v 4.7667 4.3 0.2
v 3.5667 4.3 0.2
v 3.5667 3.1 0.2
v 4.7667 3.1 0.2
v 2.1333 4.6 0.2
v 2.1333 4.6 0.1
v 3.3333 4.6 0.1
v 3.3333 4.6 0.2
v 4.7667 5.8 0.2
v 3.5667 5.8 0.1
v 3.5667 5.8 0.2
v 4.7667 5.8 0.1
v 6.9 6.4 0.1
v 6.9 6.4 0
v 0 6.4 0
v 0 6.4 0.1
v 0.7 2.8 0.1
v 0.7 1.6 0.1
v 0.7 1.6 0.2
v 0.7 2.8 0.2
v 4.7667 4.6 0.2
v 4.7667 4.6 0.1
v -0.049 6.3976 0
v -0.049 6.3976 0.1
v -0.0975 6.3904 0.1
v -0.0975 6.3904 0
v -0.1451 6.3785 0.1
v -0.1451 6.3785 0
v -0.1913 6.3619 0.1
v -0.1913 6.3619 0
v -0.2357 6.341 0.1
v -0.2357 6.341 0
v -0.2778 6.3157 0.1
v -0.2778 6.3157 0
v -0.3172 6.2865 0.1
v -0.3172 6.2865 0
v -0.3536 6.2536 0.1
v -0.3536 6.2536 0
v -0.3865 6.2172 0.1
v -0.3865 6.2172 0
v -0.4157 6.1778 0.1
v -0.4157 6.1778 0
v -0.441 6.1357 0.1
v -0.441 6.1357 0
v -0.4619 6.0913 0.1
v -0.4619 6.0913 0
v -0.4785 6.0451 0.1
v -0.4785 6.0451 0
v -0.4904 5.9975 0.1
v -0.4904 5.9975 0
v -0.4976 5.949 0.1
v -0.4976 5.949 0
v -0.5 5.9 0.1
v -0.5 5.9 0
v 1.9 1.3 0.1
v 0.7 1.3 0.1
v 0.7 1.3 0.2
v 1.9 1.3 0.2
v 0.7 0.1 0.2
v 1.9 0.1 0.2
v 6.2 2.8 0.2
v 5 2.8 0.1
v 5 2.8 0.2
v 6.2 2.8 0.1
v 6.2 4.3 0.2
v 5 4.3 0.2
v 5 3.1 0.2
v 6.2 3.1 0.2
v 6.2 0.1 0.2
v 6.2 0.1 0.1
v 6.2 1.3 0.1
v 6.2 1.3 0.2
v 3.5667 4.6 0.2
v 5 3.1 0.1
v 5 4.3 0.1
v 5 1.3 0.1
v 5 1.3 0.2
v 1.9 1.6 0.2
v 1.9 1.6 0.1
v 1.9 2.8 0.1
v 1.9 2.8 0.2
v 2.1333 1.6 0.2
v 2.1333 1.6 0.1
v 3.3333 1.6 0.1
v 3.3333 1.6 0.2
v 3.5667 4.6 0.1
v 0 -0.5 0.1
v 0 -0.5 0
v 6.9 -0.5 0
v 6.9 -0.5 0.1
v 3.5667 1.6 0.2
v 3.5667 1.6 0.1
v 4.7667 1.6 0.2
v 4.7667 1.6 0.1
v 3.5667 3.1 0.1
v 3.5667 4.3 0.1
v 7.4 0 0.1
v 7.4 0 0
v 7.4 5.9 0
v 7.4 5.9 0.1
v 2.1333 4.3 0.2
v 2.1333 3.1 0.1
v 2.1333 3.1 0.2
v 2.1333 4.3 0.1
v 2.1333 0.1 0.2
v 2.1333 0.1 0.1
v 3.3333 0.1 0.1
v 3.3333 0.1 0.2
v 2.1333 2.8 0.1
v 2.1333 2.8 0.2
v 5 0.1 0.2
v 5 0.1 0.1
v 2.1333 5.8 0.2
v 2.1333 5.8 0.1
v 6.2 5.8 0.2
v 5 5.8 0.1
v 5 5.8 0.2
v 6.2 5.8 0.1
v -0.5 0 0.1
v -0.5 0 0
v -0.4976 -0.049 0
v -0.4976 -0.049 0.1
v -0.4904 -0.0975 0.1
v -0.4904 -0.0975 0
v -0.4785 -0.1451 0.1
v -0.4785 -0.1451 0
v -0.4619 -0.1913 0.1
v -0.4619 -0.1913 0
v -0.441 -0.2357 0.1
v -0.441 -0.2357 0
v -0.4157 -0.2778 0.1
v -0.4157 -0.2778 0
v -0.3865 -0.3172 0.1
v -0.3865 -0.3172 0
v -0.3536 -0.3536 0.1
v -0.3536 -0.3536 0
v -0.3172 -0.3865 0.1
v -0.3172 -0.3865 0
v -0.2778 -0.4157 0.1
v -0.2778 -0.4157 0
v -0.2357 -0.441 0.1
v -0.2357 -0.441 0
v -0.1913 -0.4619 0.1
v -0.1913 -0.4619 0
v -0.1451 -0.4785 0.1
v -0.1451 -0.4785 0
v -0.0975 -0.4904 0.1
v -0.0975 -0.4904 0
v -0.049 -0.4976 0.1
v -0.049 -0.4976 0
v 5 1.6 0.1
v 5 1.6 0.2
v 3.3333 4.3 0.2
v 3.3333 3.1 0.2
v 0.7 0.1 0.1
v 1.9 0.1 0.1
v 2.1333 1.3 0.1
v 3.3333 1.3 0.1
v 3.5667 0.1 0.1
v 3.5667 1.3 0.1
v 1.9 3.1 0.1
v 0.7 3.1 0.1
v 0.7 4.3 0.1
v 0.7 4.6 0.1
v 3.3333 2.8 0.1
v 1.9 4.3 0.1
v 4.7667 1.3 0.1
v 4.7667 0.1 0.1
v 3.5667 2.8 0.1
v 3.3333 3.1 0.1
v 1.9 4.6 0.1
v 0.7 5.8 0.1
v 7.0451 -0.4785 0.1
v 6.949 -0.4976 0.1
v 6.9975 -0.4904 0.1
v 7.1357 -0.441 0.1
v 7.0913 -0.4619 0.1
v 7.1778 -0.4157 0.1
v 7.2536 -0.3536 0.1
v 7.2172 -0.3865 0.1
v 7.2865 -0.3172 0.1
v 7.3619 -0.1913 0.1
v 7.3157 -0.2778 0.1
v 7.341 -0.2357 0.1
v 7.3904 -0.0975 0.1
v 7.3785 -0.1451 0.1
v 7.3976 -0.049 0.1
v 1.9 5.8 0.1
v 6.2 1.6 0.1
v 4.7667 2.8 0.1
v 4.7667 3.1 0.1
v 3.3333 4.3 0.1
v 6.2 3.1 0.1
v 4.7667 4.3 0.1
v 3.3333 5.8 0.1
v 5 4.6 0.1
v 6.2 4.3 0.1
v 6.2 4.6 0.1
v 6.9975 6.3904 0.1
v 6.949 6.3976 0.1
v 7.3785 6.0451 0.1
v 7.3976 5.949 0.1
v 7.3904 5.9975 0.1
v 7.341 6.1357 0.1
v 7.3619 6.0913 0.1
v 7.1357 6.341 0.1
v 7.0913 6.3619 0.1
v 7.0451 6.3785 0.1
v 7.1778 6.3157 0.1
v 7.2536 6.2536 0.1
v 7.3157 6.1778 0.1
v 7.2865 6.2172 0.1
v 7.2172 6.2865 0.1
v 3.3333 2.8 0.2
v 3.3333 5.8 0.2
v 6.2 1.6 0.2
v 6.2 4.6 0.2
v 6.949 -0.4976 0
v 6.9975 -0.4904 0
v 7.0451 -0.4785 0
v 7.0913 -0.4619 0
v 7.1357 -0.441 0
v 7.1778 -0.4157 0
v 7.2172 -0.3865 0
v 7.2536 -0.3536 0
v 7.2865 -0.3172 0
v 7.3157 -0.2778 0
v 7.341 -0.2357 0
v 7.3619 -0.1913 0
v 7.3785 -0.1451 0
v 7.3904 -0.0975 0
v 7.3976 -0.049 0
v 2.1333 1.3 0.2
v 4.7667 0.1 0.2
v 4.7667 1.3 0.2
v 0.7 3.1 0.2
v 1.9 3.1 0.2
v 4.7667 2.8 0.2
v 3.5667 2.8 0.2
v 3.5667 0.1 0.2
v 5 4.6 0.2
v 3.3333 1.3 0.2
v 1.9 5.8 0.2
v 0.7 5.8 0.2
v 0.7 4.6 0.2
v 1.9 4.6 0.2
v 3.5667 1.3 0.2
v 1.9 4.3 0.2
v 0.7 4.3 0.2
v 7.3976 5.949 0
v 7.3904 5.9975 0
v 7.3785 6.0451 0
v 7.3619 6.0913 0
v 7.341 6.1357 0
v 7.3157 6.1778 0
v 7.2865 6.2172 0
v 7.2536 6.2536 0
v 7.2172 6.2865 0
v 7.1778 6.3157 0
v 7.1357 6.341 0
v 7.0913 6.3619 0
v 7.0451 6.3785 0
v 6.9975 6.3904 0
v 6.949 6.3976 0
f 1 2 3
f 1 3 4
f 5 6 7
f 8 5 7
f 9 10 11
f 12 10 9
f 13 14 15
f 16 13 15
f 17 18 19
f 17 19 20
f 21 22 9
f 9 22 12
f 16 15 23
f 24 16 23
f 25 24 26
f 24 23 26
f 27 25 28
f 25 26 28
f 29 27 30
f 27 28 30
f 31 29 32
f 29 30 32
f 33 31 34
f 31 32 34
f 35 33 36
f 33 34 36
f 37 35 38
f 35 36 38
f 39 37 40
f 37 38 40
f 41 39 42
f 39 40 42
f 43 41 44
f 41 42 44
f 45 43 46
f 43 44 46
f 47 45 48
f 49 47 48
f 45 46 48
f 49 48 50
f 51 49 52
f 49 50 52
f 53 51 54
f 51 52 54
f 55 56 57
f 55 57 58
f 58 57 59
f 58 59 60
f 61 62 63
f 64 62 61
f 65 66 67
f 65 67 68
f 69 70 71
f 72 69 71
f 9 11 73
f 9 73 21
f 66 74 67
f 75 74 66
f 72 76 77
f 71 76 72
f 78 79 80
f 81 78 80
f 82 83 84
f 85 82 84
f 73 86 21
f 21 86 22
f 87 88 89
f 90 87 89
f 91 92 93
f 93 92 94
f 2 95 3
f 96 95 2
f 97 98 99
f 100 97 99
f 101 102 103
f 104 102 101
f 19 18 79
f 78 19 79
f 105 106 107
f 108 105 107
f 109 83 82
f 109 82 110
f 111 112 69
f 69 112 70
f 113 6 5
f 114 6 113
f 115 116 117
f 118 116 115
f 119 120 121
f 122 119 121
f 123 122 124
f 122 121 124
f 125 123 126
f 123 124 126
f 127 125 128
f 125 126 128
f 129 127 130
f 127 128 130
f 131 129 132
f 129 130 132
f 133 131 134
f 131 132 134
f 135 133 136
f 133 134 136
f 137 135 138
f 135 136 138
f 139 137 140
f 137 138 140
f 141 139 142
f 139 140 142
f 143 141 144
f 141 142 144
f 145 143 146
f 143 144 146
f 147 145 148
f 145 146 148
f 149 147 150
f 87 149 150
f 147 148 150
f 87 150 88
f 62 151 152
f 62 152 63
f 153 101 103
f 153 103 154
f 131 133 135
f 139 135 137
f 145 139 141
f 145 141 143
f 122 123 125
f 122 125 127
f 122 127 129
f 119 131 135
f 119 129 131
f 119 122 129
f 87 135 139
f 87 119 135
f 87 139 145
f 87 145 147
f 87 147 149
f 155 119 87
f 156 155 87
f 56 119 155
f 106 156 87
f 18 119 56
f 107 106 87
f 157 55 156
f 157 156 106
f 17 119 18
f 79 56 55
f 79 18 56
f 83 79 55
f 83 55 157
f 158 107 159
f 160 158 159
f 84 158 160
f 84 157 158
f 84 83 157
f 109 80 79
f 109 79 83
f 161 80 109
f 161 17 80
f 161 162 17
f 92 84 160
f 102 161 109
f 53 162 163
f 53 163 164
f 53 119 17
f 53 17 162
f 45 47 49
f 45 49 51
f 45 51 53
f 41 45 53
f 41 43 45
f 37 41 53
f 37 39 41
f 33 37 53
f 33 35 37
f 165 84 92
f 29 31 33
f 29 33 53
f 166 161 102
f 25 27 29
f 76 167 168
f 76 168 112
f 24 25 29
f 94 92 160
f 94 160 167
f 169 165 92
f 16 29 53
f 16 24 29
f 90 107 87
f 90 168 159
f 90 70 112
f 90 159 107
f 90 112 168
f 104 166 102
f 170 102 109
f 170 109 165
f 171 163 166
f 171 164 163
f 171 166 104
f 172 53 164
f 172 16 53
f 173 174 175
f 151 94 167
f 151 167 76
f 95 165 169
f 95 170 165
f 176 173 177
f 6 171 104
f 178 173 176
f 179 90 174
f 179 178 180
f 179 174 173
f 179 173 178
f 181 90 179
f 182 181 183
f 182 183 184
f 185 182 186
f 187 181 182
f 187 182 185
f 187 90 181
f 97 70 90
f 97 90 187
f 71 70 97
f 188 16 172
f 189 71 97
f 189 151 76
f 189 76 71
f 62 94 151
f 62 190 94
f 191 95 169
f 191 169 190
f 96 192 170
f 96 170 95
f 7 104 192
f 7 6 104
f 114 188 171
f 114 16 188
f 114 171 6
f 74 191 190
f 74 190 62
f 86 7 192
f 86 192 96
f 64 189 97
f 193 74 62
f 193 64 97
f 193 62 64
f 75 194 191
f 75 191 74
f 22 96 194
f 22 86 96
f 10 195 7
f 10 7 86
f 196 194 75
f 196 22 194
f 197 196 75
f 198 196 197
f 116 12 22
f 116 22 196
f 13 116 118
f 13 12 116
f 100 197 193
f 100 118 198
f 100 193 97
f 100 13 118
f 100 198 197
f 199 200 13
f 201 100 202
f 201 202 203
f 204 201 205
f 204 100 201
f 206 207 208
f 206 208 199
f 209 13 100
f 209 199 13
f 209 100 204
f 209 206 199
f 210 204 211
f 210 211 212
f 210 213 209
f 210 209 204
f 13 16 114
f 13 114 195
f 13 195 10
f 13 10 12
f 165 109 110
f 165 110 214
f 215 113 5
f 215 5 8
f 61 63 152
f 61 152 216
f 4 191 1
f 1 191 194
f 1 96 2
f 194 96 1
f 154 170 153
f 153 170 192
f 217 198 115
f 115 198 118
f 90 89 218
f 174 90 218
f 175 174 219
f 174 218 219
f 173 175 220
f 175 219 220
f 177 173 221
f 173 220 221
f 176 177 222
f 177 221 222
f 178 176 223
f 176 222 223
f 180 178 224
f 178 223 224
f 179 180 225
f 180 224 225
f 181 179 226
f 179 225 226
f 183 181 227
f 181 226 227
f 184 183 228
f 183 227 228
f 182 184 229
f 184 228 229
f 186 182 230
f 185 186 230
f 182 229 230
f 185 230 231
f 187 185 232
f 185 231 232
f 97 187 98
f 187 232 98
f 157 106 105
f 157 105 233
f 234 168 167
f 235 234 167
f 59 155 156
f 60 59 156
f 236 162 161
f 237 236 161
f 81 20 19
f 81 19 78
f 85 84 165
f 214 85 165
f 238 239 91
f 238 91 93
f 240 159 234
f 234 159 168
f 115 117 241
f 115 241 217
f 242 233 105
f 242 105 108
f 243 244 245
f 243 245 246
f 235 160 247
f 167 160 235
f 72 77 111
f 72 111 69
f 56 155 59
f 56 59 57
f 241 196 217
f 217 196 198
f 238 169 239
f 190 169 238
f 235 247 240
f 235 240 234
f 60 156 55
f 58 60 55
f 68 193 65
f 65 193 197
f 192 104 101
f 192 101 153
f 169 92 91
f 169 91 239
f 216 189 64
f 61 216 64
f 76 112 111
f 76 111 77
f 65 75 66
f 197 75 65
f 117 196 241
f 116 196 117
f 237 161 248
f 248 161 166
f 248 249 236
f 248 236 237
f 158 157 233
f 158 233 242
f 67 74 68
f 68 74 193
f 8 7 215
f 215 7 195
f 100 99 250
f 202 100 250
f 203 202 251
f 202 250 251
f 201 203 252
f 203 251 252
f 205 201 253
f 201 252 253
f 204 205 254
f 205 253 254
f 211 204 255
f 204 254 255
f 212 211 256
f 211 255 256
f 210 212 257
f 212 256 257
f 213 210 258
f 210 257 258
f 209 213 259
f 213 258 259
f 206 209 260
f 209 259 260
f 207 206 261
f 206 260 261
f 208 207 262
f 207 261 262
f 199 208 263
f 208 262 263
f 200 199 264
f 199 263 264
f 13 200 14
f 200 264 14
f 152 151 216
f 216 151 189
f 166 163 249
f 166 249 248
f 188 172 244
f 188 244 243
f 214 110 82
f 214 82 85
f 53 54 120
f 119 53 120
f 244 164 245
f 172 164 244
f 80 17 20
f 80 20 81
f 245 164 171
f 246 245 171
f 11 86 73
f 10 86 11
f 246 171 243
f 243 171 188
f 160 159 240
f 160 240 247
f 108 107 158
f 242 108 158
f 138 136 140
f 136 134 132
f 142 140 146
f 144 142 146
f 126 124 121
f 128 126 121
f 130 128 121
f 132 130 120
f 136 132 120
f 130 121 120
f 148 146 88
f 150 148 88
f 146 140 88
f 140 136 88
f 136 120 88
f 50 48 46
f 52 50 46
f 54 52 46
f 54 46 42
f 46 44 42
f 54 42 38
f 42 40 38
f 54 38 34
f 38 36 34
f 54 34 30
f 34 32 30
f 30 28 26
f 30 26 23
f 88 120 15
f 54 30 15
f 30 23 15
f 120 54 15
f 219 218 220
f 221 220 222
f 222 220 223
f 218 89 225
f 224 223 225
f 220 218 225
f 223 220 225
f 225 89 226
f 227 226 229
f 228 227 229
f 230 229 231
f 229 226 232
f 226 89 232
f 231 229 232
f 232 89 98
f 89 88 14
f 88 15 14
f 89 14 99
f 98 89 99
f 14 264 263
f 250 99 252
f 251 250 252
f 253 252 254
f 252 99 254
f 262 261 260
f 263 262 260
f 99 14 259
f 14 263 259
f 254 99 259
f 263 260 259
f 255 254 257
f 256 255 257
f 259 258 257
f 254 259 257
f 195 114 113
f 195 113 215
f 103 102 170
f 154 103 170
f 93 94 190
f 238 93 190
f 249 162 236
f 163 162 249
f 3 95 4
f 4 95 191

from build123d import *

# Parameters (mm, degrees)
BOSS_EXTRU_1_DEPTH = 0.1
ESQUISSE2_W        = 1.2
ESQUISSE2_H        = 1.2
BOSS_EXTRU_2_DEPTH = 0.1


with BuildPart() as part:
    # Esquisse1 → Boss.-Extru.1 (new body)
    with BuildSketch(Plane.XY):
        with BuildLine():
            Line((0, -0.5), (6.9, -0.5))
            ThreePointArc((6.9, -0.5), (7.253553391, -0.353553391), (7.4, 0))
            Line((7.4, 0), (7.4, 5.9))
            ThreePointArc((7.4, 5.9), (7.253553391, 6.253553391), (6.9, 6.4))
            Line((6.9, 6.4), (0, 6.4))
            ThreePointArc((0, 6.4), (-0.353553391, 6.253553391), (-0.5, 5.9))
            Line((-0.5, 5.9), (-0.5, 0))
            ThreePointArc((-0.5, 0), (-0.353553391, -0.353553391), (0, -0.5))
        make_face()
    extrude(amount=BOSS_EXTRU_1_DEPTH)

    # Esquisse2 → Boss.-Extru.2 (add)
    with BuildSketch(Plane.XY.offset(0.1)):
        with Locations((1.3, 0.7)):
            Rectangle(ESQUISSE2_W, ESQUISSE2_H)
        with Locations((2.733333333, 0.7)):
            Rectangle(ESQUISSE2_W, ESQUISSE2_H)
        with Locations((4.166666667, 0.7)):
            Rectangle(ESQUISSE2_W, ESQUISSE2_H)
        with Locations((5.6, 0.7)):
            Rectangle(ESQUISSE2_W, ESQUISSE2_H)
        with Locations((2.733333333, 2.2)):
            Rectangle(ESQUISSE2_W, ESQUISSE2_H)
        with Locations((4.166666667, 2.2)):
            Rectangle(ESQUISSE2_W, ESQUISSE2_H)
        with Locations((5.6, 2.2)):
            Rectangle(ESQUISSE2_W, ESQUISSE2_H)
        with Locations((2.733333333, 3.7)):
            Rectangle(ESQUISSE2_W, ESQUISSE2_H)
        with Locations((4.166666667, 3.7)):
            Rectangle(ESQUISSE2_W, ESQUISSE2_H)
        with Locations((5.6, 3.7)):
            Rectangle(ESQUISSE2_W, ESQUISSE2_H)
        with Locations((2.733333333, 5.2)):
            Rectangle(ESQUISSE2_W, ESQUISSE2_H)
        with Locations((4.166666667, 5.2)):
            Rectangle(ESQUISSE2_W, ESQUISSE2_H)
        with Locations((5.6, 5.2)):
            Rectangle(ESQUISSE2_W, ESQUISSE2_H)
        with Locations((1.3, 2.2)):
            Rectangle(ESQUISSE2_W, ESQUISSE2_H)
        with Locations((1.3, 3.7)):
            Rectangle(ESQUISSE2_W, ESQUISSE2_H)
        with Locations((1.3, 5.2)):
            Rectangle(ESQUISSE2_W, ESQUISSE2_H)
    extrude(amount=BOSS_EXTRU_2_DEPTH)


solid = part.part
